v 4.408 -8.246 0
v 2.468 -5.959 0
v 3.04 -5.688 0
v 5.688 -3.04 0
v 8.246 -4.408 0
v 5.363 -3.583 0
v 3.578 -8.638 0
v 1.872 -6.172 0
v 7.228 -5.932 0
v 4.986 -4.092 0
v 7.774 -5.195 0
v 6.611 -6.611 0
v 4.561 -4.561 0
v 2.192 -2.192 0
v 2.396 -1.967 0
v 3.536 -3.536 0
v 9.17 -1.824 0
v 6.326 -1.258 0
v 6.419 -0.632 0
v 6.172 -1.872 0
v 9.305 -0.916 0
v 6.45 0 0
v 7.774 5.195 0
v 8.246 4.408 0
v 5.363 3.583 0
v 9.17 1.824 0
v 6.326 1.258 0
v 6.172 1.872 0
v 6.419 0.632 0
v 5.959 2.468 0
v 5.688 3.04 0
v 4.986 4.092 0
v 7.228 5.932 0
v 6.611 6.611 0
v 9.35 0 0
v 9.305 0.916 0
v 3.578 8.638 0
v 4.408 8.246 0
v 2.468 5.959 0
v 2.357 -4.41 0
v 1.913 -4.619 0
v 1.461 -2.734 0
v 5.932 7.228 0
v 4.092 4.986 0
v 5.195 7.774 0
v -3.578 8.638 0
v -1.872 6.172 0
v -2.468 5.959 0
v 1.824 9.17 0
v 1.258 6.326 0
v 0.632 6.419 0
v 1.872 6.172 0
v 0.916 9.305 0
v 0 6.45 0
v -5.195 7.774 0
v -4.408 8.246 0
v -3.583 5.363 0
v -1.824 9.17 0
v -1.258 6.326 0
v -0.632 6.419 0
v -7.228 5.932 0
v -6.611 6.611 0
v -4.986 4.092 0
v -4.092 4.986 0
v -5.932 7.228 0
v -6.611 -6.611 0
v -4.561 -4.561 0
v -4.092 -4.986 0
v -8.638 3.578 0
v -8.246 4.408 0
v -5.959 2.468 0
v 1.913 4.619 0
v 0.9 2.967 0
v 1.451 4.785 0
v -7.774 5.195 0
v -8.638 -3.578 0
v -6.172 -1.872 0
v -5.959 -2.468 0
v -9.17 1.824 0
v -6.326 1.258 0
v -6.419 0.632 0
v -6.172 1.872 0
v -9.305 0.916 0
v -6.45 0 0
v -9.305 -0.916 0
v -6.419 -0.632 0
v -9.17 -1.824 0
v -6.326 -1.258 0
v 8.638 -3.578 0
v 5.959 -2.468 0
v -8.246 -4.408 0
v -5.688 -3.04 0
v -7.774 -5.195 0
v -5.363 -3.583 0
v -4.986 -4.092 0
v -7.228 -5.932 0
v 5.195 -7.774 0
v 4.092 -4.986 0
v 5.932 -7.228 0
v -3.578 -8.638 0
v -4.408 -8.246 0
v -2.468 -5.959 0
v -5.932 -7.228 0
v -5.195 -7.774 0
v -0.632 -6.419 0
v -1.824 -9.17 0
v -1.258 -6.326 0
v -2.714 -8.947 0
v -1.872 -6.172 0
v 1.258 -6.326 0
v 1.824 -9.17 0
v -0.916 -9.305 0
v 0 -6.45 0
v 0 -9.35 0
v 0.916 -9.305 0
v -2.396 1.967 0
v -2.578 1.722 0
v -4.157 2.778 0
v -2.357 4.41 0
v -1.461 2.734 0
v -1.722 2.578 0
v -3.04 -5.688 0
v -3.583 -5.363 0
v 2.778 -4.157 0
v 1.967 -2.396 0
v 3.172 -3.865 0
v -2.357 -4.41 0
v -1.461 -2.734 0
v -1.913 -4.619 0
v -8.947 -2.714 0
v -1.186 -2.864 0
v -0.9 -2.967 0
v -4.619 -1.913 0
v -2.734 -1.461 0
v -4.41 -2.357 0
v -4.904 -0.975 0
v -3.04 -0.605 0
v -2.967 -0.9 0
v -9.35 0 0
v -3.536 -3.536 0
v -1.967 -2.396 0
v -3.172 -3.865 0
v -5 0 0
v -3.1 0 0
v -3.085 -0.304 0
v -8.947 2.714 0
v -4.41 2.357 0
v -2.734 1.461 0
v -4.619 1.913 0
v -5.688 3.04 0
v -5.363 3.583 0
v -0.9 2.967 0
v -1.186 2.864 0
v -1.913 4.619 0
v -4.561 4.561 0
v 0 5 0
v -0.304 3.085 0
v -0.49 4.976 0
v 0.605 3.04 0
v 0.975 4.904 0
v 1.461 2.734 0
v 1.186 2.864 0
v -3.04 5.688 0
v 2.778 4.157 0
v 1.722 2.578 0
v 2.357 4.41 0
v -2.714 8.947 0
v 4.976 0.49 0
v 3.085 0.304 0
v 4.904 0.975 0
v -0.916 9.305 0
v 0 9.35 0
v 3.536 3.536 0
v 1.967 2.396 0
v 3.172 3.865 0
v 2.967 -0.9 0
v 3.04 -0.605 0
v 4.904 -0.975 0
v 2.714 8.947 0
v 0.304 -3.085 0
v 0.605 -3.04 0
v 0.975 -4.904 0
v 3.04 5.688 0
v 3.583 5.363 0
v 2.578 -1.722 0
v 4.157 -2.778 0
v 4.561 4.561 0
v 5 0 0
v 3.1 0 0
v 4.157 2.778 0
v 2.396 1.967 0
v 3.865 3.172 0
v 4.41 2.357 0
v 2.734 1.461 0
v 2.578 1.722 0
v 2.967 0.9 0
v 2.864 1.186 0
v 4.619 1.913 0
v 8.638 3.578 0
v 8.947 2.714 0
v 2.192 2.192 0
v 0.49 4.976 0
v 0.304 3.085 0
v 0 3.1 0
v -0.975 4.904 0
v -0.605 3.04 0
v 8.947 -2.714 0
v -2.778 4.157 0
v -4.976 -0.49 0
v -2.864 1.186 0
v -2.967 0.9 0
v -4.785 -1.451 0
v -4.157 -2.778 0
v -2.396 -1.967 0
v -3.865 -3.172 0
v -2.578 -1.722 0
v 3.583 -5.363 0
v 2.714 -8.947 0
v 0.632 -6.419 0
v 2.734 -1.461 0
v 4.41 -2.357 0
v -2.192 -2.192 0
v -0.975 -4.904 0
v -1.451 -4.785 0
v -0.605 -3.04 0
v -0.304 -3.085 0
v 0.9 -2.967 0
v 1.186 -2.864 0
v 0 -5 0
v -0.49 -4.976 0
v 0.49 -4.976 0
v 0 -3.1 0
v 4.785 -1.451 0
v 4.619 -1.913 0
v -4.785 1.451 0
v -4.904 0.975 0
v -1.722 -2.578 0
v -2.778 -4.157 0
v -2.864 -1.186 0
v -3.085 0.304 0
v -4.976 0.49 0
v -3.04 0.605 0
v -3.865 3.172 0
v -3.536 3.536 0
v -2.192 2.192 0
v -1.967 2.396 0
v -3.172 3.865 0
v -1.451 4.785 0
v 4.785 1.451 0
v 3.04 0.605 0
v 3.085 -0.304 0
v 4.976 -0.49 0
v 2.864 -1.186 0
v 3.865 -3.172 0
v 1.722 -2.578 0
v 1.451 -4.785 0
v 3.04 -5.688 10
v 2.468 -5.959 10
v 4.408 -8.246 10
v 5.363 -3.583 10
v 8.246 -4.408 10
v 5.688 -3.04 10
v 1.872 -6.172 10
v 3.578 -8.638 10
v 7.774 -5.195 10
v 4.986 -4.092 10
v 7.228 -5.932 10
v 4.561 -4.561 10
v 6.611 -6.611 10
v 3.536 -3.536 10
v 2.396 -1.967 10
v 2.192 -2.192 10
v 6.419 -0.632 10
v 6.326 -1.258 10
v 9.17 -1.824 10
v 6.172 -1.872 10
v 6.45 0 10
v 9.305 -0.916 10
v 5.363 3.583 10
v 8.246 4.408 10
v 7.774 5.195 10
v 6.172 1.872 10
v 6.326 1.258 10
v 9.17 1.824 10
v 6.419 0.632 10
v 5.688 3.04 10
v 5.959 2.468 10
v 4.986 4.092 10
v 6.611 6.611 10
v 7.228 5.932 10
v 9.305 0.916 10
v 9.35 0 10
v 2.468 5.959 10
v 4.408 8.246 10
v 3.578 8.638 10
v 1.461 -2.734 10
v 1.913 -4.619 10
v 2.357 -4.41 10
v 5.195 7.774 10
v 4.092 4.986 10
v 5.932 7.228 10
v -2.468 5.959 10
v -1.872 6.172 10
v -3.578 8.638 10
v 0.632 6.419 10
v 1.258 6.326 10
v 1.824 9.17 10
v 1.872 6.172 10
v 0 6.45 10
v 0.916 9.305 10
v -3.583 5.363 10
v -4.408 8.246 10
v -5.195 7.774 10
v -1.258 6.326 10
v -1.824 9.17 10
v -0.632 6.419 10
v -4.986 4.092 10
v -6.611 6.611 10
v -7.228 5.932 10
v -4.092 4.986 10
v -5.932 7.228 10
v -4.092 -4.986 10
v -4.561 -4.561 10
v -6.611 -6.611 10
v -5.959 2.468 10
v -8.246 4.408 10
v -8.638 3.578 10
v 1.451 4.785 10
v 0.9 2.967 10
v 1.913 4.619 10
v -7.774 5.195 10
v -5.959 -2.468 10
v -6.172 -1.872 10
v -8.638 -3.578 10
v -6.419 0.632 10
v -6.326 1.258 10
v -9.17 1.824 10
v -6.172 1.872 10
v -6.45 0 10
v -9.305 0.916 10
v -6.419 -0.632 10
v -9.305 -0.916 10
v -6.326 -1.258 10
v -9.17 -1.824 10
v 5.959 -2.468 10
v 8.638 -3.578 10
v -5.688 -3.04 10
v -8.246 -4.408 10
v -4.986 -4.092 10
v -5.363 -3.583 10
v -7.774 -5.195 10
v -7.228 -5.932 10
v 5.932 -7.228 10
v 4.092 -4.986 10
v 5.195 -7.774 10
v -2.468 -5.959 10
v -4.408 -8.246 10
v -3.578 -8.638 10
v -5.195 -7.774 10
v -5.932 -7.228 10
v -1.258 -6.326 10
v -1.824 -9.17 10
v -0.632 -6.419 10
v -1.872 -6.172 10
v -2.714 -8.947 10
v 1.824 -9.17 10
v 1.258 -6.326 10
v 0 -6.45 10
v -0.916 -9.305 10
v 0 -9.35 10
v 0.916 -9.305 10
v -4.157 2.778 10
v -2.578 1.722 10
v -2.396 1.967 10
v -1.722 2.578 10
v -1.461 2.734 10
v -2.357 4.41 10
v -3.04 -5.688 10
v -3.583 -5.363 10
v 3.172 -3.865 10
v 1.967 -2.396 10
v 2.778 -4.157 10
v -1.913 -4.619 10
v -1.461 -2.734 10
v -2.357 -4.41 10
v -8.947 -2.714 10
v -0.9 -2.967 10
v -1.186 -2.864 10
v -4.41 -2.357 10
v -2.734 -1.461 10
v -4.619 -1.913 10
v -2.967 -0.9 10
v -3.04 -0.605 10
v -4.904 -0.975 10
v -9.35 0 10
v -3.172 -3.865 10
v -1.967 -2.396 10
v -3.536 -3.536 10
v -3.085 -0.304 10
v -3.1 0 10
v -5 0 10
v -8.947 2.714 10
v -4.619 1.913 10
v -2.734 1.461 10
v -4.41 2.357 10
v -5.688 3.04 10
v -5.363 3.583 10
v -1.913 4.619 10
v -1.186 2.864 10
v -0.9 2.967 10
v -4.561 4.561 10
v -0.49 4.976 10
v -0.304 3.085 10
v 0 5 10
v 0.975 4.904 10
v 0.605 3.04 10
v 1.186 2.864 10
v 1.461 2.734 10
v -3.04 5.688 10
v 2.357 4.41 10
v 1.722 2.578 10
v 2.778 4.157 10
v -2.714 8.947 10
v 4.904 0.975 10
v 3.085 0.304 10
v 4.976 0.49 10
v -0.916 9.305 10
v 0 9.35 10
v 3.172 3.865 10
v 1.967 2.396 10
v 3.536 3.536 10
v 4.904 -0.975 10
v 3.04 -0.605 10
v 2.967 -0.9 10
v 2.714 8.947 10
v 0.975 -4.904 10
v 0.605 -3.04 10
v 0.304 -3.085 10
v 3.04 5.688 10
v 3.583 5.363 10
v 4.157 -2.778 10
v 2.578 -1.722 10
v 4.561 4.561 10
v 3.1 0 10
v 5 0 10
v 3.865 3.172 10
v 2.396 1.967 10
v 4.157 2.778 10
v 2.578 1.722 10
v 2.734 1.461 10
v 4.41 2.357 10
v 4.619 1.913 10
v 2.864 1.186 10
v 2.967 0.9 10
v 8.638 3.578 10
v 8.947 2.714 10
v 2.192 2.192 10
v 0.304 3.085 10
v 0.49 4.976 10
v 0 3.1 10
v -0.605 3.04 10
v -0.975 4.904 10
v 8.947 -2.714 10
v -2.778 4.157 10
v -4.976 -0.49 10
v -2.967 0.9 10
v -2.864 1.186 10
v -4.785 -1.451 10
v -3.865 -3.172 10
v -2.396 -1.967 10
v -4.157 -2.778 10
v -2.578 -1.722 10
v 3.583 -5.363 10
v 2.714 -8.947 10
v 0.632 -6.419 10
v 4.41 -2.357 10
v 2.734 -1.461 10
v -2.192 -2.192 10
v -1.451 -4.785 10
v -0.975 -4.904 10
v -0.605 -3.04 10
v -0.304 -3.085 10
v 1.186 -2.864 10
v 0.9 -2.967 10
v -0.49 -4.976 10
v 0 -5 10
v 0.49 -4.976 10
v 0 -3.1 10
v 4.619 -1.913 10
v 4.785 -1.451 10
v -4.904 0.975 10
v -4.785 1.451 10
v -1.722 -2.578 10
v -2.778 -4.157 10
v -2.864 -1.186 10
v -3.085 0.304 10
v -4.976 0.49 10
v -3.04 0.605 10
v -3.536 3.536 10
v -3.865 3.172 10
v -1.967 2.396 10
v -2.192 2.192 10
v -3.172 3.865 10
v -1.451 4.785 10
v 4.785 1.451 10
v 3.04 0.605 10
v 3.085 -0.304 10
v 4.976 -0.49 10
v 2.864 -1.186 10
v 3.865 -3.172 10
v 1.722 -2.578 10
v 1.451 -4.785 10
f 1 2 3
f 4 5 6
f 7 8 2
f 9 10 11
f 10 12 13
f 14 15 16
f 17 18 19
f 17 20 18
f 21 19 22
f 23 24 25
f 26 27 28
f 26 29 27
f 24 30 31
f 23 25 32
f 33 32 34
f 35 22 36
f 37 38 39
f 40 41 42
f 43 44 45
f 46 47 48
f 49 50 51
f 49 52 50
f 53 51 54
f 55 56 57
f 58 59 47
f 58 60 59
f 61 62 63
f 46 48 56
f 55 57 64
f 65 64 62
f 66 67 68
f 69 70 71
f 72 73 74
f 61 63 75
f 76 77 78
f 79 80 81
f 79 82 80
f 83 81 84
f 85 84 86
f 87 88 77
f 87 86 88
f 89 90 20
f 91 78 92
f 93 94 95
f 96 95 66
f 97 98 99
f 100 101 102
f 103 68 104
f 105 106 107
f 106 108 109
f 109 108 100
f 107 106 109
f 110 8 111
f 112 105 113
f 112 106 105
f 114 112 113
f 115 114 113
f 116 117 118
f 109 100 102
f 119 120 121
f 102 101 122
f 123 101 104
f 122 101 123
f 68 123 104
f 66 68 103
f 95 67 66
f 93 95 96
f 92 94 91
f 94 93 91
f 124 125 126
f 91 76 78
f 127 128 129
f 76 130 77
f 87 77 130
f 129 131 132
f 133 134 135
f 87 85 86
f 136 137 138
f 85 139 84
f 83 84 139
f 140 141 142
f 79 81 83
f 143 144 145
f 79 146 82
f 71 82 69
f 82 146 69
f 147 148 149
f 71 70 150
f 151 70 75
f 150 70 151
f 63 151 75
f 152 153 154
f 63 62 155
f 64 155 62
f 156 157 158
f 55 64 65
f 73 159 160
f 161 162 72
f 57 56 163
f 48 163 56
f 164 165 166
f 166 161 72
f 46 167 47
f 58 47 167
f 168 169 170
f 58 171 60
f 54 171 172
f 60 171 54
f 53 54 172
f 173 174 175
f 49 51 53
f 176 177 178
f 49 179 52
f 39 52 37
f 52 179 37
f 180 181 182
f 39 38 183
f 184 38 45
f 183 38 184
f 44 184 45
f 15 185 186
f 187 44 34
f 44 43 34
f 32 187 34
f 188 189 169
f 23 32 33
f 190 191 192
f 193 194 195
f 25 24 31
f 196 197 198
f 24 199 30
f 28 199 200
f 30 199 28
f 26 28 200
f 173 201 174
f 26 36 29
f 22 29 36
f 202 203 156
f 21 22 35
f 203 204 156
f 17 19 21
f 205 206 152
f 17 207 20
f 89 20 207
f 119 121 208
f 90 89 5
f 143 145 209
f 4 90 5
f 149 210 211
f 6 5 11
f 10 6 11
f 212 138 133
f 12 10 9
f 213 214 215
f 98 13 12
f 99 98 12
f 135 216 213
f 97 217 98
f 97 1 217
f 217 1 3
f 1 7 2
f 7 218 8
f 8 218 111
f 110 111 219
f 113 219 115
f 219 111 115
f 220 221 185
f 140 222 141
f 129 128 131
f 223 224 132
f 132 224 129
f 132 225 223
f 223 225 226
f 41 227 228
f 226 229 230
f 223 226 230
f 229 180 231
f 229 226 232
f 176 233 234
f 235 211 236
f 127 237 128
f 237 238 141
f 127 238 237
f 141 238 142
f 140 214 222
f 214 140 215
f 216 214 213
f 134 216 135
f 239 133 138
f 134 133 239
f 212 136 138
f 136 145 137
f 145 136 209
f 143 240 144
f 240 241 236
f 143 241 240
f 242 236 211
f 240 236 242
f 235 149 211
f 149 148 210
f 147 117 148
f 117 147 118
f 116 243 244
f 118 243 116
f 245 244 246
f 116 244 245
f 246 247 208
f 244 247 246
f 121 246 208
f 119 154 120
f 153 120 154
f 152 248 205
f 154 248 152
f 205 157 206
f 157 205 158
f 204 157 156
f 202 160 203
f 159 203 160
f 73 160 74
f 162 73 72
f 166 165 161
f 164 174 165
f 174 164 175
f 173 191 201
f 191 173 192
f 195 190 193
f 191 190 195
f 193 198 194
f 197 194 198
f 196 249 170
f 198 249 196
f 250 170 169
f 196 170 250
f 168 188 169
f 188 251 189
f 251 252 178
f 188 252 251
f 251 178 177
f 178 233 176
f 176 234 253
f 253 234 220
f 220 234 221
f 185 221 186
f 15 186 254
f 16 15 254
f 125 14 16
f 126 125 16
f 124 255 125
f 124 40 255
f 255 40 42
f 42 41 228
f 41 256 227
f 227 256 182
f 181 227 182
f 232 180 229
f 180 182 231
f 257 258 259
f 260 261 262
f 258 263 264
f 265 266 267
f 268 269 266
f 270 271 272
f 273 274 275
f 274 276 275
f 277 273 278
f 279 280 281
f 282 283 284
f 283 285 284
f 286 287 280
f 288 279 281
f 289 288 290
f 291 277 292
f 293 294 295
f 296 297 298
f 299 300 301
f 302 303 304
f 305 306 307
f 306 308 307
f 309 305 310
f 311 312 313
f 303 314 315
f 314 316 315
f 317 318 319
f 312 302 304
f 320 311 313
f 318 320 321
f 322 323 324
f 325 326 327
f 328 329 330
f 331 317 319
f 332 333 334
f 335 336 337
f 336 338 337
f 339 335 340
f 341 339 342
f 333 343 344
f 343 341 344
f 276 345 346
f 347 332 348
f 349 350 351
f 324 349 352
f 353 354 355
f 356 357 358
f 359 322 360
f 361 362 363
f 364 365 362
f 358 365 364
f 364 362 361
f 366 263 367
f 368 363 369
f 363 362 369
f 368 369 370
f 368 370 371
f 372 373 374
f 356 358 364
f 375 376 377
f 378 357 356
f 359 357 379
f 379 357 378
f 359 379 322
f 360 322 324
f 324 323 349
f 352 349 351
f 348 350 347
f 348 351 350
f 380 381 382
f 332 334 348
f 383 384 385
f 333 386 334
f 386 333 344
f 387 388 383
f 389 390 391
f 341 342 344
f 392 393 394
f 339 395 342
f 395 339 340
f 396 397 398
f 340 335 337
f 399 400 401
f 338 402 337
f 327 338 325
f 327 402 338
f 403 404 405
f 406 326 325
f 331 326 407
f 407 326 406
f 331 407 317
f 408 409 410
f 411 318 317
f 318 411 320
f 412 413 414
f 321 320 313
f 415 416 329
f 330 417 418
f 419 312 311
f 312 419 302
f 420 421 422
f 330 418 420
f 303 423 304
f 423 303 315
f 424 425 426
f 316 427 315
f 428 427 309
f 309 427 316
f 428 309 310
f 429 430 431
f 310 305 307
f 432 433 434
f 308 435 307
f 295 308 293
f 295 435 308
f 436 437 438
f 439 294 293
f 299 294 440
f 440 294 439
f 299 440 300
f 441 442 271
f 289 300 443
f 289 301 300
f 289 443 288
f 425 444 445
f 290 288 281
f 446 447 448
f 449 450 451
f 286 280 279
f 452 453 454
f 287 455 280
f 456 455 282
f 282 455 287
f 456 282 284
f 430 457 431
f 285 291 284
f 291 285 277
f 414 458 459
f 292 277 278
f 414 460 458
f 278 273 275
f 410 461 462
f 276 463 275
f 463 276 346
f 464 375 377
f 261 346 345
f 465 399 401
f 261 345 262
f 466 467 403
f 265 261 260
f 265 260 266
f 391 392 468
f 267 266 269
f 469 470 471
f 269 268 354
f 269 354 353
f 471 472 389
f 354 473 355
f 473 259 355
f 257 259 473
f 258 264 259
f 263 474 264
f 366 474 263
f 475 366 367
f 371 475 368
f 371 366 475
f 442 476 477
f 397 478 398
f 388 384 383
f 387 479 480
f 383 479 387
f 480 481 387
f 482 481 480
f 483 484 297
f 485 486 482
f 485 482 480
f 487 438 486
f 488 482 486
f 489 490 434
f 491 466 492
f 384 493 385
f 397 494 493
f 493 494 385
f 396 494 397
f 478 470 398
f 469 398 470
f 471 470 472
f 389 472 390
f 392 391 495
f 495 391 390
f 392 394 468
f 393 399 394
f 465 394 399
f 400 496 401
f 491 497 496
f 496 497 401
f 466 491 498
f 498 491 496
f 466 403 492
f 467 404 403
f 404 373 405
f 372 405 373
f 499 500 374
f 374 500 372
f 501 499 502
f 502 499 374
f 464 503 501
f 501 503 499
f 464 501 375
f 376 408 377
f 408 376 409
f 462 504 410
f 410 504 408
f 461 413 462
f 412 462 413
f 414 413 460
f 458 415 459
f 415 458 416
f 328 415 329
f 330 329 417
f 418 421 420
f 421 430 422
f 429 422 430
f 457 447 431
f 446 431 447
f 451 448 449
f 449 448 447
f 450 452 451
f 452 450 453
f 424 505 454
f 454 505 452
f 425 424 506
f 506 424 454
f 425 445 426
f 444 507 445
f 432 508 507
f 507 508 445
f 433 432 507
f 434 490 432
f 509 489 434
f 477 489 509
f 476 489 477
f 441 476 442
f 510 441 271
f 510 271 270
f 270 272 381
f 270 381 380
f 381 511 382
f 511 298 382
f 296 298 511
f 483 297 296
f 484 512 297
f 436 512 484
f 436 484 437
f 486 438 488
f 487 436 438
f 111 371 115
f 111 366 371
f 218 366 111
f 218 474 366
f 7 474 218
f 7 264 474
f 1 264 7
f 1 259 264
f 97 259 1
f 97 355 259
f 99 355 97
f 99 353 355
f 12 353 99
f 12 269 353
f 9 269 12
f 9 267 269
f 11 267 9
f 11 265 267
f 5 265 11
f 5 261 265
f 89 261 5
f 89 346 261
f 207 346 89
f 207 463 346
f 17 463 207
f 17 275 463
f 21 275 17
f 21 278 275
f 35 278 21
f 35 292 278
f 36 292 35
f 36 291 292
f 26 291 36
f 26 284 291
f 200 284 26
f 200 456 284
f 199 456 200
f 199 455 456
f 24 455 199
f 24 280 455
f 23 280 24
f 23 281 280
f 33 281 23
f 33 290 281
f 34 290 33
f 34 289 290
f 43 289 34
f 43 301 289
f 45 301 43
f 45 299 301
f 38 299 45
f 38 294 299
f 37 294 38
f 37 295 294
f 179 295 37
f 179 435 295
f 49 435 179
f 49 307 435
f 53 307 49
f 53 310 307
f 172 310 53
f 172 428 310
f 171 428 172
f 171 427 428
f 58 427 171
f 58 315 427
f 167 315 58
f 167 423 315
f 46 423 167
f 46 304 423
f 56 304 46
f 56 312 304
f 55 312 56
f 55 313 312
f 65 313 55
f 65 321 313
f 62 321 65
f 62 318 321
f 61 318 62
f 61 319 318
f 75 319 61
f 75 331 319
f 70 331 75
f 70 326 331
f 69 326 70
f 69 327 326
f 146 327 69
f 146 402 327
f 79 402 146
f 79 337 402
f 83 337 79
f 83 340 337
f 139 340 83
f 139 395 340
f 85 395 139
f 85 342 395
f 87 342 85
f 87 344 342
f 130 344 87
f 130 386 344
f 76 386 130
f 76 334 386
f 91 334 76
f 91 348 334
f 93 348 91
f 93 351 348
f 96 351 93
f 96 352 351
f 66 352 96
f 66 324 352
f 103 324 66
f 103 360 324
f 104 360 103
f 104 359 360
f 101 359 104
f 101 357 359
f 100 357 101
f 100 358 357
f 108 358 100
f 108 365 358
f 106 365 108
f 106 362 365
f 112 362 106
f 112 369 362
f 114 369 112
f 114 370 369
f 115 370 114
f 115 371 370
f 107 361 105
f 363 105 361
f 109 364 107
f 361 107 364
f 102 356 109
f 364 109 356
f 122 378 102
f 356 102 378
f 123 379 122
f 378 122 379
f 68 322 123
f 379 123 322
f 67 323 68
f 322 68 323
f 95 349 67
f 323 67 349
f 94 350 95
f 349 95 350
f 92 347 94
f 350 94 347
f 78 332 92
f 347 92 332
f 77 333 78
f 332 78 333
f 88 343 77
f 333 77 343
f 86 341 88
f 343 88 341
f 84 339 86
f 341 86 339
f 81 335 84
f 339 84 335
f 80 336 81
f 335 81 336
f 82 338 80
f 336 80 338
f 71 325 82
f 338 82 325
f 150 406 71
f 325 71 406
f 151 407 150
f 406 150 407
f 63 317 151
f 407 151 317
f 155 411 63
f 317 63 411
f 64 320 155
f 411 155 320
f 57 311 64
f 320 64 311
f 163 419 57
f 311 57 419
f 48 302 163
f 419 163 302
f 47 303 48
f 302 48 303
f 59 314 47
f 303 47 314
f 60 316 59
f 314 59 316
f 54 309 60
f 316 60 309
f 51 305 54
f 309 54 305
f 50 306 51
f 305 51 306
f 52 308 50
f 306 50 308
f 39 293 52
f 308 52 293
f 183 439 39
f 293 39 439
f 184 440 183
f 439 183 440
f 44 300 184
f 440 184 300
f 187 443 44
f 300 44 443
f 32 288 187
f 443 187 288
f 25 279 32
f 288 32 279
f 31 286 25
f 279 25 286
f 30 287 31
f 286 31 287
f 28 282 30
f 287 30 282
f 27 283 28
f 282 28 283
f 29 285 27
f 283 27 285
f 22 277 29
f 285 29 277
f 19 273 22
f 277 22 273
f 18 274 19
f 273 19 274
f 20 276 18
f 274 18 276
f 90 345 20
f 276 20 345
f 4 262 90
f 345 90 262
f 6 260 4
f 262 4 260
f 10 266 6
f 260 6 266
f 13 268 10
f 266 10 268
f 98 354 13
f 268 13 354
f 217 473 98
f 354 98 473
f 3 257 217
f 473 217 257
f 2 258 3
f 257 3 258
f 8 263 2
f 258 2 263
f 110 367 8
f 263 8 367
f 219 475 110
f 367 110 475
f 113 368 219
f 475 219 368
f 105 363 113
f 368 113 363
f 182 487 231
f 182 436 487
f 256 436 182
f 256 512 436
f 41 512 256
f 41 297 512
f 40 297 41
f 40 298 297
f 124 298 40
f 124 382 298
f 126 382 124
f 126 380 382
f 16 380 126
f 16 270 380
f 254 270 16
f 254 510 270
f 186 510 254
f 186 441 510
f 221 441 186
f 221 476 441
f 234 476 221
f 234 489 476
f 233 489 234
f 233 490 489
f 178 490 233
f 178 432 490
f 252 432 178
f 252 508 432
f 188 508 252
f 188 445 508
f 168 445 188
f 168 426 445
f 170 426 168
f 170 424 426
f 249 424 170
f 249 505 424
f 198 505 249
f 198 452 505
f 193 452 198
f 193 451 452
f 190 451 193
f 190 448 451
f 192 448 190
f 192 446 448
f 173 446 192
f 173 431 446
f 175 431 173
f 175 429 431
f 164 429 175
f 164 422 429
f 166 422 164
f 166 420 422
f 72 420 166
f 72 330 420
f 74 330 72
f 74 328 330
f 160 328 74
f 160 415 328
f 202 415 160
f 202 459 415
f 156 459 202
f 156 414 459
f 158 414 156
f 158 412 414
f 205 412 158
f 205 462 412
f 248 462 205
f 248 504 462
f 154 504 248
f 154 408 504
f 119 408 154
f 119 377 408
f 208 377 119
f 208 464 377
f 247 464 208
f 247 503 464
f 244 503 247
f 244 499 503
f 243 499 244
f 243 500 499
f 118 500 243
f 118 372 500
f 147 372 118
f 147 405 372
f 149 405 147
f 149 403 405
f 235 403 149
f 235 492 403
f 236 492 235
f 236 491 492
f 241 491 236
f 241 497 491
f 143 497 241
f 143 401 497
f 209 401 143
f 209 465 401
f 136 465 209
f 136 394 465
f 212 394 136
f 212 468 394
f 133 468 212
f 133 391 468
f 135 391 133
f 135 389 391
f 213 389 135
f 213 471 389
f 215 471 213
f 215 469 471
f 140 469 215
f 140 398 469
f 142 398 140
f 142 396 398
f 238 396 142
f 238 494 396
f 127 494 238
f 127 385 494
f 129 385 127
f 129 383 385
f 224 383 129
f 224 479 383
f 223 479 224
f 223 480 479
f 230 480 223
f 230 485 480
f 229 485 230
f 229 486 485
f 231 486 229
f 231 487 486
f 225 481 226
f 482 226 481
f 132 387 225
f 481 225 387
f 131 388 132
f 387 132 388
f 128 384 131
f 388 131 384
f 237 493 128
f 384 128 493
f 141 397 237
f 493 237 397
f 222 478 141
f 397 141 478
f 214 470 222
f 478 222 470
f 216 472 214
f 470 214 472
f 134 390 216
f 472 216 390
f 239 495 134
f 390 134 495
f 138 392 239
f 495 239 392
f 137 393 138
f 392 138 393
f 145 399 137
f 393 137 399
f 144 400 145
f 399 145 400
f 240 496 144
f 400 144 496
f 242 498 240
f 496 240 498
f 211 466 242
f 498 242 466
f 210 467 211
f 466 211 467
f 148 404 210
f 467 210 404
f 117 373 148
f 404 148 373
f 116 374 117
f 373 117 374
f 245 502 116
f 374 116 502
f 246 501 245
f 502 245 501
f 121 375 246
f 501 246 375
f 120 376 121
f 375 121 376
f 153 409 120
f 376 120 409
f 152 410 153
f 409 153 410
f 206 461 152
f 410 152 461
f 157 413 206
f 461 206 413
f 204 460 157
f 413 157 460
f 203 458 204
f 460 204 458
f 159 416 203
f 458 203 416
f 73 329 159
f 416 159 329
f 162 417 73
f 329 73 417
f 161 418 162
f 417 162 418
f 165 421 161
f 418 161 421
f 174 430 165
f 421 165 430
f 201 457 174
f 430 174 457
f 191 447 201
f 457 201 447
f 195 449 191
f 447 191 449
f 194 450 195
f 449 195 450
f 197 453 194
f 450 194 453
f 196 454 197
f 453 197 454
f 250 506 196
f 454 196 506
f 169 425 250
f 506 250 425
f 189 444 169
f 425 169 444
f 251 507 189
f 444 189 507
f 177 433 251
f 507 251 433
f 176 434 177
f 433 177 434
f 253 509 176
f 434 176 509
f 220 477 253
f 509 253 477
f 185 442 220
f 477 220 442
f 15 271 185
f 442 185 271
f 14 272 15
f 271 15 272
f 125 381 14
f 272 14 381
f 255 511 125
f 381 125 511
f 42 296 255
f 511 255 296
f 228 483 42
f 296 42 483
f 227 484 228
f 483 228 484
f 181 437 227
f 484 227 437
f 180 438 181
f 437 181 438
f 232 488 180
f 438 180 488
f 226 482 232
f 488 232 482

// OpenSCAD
// Snap-on Clip for Lab Stand Rod and Tubing

// Global settings
$fn = 64;

// Dimensions based on user input (in mm)
clip_height = 10;       // Total height of the clip extrusion (Z dimension)

// Rod Ring Dimensions (for 12.7mm rod)
rod_inner_diameter = 12.7; // Inner diameter for the lab stand rod
rod_wall_thickness = 3;    // Wall thickness of the ring
rod_outer_diameter = rod_inner_diameter + 2 * rod_wall_thickness; // Outer diameter (18.7mm)

// Rod Ring Cutout Dimensions
rod_cutout_width = 10;     // Width of the opening cut on the -X side
rod_cutout_y_range = 5;    // Y range for the cutout (-5 to 5)

// Tubing Ring Dimensions (for tubing)
tubing_inner_diameter = 6; // Inner diameter for the tubing
tubing_wall_thickness = 2;  // Wall thickness of the ring
tubing_outer_diameter = tubing_inner_diameter + 2 * tubing_wall_thickness; // Outer diameter (10mm)

// Tubing Ring Position and Cutout
tubing_center_x = 15;      // X position of the tubing ring center
tubing_cutout_width = 4.5;  // Width of the opening cut on the +X side
tubing_cutout_y_range = 2.25; // Y range for the cutout (-2.25 to 2.25)

// Bridge Dimensions
bridge_width_y = 6;       // Width in Y direction
bridge_start_x = 8;       // Start X coordinate of the bridge
bridge_end_x = 12;        // End X coordinate of the bridge


// --- Module Definitions ---

// Creates a hollow ring shape centered at (cx, cy)
module create_ring(inner_d, outer_d, cx, cy) {
    difference() {
        circle(r = outer_d / 2, center = [cx, cy]);
        circle(r = inner_d / 2 + 0.1, center = [cx, cy]); // Slightly larger cutout for clean subtraction
    }
}

// --- Component Construction (2D Profile) ---

module rod_ring() {
    // Base ring centered at origin
    create_ring(rod_inner_diameter, rod_outer_diameter, 0, 0);

    // Cutout on the -X side to snap onto the rod
    translate([-(rod_outer_diameter / 2) + 1, 0, 0]) // Start cutout slightly outside the ring edge for safety
    difference() {
        cube([rod_cutout_width + 0.1, 2 * rod_cutout_y_range + 0.2, 0.1]);
        // Ensure the cutout is centered vertically around y=0 relative to its starting point
        translate([0, -rod_cutout_y_range]) {
            cube([rod_cutout_width + 0.1, 2 * rod_cutout_y_range + 0.2, 0.1]);
        }
    }
}

module tubing_ring() {
    // Base ring centered at (tubing_center_x, 0)
    create_ring(tubing_inner_diameter, tubing_outer_diameter, tubing_center_x, 0);

    // Cutout on the +X side to allow tubing passage
    translate([tubing_center_x + (tubing_outer_diameter / 2) - 1, 0, 0]) // Start cutout slightly outside the ring edge for safety
    difference() {
        cube([tubing_cutout_width + 0.1, 2 * tubing_cutout_y_range + 0.2, 0.1]);
         // Ensure the cutout is centered vertically around y=0 relative to its starting point
        translate([0, -tubing_cutout_y_range]) {
            cube([tubing_cutout_width + 0.1, 2 * tubing_cutout_y_range + 0.2, 0.1]);
        }
    }
}

module bridge() {
    // Solid rectangular bridge connecting the two rings
    cube([bridge_end_x - bridge_start_x, bridge_width_y, 0.1]); // Thickness of the bridge profile
    translate([bridge_start_x, 0, 0]);
}


// --- Final Assembly (2D Profile) ---

module clip_profile() {
    union() {
        rod_ring();
        tubing_ring();
        bridge();
    }
}

// Extrude the final profile to create the 3D part
difference() {
    // Main body extrusion
    linear_extrude(height = clip_height) {
        clip_profile();
    }

    // Optional: Add a small cutout at the bottom center if needed for easier removal, but sticking strictly to description.
}
